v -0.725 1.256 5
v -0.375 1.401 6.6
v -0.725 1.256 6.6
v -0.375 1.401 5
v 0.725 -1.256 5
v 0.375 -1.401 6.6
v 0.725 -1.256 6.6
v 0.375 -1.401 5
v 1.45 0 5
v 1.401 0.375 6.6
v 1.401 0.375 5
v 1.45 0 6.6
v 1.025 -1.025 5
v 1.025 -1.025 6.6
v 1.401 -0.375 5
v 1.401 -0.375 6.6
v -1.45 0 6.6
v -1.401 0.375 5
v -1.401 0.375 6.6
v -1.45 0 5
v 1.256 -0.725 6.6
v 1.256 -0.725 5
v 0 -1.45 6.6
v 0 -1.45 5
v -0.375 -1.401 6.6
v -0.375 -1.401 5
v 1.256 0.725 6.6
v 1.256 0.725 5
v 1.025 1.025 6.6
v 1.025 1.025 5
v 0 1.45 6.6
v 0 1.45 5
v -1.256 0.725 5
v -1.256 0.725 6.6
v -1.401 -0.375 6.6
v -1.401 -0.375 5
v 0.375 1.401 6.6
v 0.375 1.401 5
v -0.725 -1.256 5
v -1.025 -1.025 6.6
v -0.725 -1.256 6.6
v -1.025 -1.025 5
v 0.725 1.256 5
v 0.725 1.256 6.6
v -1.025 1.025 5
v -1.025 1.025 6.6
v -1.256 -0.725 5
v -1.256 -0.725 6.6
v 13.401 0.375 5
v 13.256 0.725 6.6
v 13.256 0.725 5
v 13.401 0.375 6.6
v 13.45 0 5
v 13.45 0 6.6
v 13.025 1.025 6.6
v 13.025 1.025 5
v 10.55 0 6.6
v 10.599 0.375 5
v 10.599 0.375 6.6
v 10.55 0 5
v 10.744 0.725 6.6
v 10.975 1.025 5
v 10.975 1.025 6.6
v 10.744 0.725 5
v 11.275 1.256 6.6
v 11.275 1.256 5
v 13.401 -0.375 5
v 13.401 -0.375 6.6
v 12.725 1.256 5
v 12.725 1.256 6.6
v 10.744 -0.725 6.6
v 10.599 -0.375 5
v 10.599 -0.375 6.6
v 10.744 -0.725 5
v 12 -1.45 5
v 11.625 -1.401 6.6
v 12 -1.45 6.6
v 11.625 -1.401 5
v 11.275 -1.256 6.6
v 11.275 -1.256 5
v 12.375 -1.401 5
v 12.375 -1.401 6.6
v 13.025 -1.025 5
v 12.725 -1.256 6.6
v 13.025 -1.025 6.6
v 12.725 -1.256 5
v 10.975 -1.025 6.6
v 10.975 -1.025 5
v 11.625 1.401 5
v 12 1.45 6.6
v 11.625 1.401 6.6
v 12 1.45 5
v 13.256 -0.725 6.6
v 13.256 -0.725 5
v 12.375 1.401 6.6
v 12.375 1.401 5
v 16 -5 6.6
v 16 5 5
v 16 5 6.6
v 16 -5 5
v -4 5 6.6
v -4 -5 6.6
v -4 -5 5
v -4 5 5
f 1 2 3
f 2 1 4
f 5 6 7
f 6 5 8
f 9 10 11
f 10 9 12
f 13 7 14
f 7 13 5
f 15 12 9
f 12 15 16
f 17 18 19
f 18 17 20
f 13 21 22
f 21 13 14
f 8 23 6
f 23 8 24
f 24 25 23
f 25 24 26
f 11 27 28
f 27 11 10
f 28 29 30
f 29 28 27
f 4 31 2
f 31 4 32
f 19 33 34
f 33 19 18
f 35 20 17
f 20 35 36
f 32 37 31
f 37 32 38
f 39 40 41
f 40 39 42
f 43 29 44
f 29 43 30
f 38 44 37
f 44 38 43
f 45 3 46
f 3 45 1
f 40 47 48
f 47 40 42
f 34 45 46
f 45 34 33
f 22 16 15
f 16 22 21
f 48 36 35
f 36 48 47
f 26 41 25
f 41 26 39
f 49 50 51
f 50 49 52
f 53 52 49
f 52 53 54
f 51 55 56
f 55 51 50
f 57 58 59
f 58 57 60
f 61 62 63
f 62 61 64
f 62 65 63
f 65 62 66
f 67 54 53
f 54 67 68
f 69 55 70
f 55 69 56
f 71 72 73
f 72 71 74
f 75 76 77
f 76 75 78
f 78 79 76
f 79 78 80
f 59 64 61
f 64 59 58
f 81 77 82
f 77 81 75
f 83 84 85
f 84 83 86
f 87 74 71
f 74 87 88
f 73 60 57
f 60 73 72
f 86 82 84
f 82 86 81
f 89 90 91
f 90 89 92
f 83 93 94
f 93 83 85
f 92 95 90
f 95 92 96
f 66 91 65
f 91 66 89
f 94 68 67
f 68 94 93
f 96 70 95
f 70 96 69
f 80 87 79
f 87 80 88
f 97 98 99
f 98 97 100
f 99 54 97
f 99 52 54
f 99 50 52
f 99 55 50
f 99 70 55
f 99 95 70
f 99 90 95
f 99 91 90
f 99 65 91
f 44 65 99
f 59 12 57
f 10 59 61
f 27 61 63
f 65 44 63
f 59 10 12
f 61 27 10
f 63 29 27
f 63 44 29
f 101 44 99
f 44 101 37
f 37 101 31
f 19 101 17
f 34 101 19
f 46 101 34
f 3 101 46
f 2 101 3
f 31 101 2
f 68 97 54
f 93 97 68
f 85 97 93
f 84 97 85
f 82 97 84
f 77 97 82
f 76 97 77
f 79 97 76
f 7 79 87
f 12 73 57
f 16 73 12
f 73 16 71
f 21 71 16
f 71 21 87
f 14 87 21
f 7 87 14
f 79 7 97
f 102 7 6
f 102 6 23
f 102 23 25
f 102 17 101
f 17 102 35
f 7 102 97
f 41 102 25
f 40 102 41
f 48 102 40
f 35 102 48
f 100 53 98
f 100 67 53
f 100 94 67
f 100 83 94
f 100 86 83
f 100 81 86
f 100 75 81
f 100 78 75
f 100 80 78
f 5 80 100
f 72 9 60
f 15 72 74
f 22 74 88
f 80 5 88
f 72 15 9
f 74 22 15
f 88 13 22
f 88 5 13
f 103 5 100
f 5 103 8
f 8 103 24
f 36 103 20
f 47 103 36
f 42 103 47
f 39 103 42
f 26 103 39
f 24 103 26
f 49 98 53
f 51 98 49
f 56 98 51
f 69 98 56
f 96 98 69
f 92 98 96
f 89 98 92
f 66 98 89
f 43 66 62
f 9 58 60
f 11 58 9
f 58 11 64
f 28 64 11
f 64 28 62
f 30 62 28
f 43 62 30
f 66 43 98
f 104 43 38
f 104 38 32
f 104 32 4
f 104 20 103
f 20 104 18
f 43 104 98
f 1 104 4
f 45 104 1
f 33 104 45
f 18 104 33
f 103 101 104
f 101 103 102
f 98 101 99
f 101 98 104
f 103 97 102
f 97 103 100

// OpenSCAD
// A strip of 1.6 board clamped on the posts, for the catalogue.
h = 5; clamp = 1.6;
difference()
{
  translate([-4, -5, h]) cube([20, 10, clamp]);
  for (x = [0, 12]) translate([x, 0, h - 1]) cylinder(d = 2.9, h = clamp + 2, $fn = 24);
}
